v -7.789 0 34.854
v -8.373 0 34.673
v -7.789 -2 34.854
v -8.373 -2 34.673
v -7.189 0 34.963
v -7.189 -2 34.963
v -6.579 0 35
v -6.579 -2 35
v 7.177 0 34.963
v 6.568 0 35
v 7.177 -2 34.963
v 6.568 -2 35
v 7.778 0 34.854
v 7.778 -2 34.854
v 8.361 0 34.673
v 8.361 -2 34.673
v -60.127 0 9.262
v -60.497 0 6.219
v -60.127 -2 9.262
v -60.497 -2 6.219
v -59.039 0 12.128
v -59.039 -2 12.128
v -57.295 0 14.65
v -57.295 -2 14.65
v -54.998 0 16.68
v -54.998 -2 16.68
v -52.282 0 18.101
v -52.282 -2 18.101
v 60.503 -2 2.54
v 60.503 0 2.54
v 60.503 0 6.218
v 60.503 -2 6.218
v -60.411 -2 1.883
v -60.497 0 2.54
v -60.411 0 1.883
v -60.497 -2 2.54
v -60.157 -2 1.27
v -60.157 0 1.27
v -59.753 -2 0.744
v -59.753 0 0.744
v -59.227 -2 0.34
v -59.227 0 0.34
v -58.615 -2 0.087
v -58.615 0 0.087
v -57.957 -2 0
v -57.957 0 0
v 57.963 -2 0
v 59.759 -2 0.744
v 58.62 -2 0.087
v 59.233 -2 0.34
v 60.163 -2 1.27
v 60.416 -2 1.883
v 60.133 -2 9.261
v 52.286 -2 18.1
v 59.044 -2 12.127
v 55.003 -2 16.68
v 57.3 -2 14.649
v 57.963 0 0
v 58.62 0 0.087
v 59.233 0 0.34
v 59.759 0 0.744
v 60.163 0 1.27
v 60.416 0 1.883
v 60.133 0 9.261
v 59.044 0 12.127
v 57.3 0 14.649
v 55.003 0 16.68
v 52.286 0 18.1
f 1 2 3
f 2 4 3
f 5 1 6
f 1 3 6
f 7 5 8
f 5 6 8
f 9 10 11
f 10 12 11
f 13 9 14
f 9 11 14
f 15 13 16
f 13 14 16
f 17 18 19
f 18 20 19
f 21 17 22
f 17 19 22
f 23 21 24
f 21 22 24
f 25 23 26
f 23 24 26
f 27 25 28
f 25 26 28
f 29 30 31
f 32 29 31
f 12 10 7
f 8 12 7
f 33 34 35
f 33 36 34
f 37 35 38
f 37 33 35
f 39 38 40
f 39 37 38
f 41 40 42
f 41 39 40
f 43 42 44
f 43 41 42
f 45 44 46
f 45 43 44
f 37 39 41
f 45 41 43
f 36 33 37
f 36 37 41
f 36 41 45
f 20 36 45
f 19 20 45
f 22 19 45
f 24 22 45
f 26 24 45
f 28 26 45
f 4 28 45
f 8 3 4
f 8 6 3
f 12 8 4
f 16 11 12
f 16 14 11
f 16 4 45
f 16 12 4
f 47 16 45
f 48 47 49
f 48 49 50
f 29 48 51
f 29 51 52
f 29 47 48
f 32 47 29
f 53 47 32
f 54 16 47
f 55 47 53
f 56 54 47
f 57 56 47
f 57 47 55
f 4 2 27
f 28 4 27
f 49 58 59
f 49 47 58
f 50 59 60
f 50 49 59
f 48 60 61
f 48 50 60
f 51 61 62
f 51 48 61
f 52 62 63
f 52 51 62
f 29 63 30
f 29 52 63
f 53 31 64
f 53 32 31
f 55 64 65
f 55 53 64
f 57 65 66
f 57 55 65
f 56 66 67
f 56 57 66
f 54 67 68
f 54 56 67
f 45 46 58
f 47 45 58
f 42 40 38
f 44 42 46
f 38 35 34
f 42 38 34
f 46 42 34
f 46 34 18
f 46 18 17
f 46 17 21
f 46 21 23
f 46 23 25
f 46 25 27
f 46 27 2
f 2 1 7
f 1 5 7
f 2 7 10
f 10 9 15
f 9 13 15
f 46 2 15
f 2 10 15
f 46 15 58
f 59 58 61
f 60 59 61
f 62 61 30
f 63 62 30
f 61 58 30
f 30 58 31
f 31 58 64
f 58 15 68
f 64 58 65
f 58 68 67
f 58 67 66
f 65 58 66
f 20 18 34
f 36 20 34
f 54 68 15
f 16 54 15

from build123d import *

# Parameters (mm, degrees)
F1_DEPTH = 2
F2_R     = 12.7
F3_R     = 2.54
F4_R     = 5.08


with BuildPart() as f1:
    # F0 (on Front) → F1 (new body)
    with BuildSketch(Plane.XZ):
        Polygon((-60.4972, 15), (-60.4972, 0), (60.5028, 0), (60.5028, 15), (7.4943, 35), (-7.5057, 35), align=None)
    extrude(amount=F1_DEPTH)

    # F2
    f2_edges = [f1.edges().sort_by_distance(p)[0] for p in [
        (-60.4972, -1, 15),
        (60.5028, -1, 15),
    ]]
    fillet(f2_edges, radius=F2_R)

    # F3
    f3_edges = [f1.edges().sort_by_distance(p)[0] for p in [
        (-60.4972, -1, 0),
        (60.5028, -1, 0),
    ]]
    fillet(f3_edges, radius=F3_R)

    # F4
    f4_edges = [f1.edges().sort_by_distance(p)[0] for p in [
        (-7.5057, -1, 35),
        (7.4943, -1, 35),
    ]]
    fillet(f4_edges, radius=F4_R)


solid = f1.part
